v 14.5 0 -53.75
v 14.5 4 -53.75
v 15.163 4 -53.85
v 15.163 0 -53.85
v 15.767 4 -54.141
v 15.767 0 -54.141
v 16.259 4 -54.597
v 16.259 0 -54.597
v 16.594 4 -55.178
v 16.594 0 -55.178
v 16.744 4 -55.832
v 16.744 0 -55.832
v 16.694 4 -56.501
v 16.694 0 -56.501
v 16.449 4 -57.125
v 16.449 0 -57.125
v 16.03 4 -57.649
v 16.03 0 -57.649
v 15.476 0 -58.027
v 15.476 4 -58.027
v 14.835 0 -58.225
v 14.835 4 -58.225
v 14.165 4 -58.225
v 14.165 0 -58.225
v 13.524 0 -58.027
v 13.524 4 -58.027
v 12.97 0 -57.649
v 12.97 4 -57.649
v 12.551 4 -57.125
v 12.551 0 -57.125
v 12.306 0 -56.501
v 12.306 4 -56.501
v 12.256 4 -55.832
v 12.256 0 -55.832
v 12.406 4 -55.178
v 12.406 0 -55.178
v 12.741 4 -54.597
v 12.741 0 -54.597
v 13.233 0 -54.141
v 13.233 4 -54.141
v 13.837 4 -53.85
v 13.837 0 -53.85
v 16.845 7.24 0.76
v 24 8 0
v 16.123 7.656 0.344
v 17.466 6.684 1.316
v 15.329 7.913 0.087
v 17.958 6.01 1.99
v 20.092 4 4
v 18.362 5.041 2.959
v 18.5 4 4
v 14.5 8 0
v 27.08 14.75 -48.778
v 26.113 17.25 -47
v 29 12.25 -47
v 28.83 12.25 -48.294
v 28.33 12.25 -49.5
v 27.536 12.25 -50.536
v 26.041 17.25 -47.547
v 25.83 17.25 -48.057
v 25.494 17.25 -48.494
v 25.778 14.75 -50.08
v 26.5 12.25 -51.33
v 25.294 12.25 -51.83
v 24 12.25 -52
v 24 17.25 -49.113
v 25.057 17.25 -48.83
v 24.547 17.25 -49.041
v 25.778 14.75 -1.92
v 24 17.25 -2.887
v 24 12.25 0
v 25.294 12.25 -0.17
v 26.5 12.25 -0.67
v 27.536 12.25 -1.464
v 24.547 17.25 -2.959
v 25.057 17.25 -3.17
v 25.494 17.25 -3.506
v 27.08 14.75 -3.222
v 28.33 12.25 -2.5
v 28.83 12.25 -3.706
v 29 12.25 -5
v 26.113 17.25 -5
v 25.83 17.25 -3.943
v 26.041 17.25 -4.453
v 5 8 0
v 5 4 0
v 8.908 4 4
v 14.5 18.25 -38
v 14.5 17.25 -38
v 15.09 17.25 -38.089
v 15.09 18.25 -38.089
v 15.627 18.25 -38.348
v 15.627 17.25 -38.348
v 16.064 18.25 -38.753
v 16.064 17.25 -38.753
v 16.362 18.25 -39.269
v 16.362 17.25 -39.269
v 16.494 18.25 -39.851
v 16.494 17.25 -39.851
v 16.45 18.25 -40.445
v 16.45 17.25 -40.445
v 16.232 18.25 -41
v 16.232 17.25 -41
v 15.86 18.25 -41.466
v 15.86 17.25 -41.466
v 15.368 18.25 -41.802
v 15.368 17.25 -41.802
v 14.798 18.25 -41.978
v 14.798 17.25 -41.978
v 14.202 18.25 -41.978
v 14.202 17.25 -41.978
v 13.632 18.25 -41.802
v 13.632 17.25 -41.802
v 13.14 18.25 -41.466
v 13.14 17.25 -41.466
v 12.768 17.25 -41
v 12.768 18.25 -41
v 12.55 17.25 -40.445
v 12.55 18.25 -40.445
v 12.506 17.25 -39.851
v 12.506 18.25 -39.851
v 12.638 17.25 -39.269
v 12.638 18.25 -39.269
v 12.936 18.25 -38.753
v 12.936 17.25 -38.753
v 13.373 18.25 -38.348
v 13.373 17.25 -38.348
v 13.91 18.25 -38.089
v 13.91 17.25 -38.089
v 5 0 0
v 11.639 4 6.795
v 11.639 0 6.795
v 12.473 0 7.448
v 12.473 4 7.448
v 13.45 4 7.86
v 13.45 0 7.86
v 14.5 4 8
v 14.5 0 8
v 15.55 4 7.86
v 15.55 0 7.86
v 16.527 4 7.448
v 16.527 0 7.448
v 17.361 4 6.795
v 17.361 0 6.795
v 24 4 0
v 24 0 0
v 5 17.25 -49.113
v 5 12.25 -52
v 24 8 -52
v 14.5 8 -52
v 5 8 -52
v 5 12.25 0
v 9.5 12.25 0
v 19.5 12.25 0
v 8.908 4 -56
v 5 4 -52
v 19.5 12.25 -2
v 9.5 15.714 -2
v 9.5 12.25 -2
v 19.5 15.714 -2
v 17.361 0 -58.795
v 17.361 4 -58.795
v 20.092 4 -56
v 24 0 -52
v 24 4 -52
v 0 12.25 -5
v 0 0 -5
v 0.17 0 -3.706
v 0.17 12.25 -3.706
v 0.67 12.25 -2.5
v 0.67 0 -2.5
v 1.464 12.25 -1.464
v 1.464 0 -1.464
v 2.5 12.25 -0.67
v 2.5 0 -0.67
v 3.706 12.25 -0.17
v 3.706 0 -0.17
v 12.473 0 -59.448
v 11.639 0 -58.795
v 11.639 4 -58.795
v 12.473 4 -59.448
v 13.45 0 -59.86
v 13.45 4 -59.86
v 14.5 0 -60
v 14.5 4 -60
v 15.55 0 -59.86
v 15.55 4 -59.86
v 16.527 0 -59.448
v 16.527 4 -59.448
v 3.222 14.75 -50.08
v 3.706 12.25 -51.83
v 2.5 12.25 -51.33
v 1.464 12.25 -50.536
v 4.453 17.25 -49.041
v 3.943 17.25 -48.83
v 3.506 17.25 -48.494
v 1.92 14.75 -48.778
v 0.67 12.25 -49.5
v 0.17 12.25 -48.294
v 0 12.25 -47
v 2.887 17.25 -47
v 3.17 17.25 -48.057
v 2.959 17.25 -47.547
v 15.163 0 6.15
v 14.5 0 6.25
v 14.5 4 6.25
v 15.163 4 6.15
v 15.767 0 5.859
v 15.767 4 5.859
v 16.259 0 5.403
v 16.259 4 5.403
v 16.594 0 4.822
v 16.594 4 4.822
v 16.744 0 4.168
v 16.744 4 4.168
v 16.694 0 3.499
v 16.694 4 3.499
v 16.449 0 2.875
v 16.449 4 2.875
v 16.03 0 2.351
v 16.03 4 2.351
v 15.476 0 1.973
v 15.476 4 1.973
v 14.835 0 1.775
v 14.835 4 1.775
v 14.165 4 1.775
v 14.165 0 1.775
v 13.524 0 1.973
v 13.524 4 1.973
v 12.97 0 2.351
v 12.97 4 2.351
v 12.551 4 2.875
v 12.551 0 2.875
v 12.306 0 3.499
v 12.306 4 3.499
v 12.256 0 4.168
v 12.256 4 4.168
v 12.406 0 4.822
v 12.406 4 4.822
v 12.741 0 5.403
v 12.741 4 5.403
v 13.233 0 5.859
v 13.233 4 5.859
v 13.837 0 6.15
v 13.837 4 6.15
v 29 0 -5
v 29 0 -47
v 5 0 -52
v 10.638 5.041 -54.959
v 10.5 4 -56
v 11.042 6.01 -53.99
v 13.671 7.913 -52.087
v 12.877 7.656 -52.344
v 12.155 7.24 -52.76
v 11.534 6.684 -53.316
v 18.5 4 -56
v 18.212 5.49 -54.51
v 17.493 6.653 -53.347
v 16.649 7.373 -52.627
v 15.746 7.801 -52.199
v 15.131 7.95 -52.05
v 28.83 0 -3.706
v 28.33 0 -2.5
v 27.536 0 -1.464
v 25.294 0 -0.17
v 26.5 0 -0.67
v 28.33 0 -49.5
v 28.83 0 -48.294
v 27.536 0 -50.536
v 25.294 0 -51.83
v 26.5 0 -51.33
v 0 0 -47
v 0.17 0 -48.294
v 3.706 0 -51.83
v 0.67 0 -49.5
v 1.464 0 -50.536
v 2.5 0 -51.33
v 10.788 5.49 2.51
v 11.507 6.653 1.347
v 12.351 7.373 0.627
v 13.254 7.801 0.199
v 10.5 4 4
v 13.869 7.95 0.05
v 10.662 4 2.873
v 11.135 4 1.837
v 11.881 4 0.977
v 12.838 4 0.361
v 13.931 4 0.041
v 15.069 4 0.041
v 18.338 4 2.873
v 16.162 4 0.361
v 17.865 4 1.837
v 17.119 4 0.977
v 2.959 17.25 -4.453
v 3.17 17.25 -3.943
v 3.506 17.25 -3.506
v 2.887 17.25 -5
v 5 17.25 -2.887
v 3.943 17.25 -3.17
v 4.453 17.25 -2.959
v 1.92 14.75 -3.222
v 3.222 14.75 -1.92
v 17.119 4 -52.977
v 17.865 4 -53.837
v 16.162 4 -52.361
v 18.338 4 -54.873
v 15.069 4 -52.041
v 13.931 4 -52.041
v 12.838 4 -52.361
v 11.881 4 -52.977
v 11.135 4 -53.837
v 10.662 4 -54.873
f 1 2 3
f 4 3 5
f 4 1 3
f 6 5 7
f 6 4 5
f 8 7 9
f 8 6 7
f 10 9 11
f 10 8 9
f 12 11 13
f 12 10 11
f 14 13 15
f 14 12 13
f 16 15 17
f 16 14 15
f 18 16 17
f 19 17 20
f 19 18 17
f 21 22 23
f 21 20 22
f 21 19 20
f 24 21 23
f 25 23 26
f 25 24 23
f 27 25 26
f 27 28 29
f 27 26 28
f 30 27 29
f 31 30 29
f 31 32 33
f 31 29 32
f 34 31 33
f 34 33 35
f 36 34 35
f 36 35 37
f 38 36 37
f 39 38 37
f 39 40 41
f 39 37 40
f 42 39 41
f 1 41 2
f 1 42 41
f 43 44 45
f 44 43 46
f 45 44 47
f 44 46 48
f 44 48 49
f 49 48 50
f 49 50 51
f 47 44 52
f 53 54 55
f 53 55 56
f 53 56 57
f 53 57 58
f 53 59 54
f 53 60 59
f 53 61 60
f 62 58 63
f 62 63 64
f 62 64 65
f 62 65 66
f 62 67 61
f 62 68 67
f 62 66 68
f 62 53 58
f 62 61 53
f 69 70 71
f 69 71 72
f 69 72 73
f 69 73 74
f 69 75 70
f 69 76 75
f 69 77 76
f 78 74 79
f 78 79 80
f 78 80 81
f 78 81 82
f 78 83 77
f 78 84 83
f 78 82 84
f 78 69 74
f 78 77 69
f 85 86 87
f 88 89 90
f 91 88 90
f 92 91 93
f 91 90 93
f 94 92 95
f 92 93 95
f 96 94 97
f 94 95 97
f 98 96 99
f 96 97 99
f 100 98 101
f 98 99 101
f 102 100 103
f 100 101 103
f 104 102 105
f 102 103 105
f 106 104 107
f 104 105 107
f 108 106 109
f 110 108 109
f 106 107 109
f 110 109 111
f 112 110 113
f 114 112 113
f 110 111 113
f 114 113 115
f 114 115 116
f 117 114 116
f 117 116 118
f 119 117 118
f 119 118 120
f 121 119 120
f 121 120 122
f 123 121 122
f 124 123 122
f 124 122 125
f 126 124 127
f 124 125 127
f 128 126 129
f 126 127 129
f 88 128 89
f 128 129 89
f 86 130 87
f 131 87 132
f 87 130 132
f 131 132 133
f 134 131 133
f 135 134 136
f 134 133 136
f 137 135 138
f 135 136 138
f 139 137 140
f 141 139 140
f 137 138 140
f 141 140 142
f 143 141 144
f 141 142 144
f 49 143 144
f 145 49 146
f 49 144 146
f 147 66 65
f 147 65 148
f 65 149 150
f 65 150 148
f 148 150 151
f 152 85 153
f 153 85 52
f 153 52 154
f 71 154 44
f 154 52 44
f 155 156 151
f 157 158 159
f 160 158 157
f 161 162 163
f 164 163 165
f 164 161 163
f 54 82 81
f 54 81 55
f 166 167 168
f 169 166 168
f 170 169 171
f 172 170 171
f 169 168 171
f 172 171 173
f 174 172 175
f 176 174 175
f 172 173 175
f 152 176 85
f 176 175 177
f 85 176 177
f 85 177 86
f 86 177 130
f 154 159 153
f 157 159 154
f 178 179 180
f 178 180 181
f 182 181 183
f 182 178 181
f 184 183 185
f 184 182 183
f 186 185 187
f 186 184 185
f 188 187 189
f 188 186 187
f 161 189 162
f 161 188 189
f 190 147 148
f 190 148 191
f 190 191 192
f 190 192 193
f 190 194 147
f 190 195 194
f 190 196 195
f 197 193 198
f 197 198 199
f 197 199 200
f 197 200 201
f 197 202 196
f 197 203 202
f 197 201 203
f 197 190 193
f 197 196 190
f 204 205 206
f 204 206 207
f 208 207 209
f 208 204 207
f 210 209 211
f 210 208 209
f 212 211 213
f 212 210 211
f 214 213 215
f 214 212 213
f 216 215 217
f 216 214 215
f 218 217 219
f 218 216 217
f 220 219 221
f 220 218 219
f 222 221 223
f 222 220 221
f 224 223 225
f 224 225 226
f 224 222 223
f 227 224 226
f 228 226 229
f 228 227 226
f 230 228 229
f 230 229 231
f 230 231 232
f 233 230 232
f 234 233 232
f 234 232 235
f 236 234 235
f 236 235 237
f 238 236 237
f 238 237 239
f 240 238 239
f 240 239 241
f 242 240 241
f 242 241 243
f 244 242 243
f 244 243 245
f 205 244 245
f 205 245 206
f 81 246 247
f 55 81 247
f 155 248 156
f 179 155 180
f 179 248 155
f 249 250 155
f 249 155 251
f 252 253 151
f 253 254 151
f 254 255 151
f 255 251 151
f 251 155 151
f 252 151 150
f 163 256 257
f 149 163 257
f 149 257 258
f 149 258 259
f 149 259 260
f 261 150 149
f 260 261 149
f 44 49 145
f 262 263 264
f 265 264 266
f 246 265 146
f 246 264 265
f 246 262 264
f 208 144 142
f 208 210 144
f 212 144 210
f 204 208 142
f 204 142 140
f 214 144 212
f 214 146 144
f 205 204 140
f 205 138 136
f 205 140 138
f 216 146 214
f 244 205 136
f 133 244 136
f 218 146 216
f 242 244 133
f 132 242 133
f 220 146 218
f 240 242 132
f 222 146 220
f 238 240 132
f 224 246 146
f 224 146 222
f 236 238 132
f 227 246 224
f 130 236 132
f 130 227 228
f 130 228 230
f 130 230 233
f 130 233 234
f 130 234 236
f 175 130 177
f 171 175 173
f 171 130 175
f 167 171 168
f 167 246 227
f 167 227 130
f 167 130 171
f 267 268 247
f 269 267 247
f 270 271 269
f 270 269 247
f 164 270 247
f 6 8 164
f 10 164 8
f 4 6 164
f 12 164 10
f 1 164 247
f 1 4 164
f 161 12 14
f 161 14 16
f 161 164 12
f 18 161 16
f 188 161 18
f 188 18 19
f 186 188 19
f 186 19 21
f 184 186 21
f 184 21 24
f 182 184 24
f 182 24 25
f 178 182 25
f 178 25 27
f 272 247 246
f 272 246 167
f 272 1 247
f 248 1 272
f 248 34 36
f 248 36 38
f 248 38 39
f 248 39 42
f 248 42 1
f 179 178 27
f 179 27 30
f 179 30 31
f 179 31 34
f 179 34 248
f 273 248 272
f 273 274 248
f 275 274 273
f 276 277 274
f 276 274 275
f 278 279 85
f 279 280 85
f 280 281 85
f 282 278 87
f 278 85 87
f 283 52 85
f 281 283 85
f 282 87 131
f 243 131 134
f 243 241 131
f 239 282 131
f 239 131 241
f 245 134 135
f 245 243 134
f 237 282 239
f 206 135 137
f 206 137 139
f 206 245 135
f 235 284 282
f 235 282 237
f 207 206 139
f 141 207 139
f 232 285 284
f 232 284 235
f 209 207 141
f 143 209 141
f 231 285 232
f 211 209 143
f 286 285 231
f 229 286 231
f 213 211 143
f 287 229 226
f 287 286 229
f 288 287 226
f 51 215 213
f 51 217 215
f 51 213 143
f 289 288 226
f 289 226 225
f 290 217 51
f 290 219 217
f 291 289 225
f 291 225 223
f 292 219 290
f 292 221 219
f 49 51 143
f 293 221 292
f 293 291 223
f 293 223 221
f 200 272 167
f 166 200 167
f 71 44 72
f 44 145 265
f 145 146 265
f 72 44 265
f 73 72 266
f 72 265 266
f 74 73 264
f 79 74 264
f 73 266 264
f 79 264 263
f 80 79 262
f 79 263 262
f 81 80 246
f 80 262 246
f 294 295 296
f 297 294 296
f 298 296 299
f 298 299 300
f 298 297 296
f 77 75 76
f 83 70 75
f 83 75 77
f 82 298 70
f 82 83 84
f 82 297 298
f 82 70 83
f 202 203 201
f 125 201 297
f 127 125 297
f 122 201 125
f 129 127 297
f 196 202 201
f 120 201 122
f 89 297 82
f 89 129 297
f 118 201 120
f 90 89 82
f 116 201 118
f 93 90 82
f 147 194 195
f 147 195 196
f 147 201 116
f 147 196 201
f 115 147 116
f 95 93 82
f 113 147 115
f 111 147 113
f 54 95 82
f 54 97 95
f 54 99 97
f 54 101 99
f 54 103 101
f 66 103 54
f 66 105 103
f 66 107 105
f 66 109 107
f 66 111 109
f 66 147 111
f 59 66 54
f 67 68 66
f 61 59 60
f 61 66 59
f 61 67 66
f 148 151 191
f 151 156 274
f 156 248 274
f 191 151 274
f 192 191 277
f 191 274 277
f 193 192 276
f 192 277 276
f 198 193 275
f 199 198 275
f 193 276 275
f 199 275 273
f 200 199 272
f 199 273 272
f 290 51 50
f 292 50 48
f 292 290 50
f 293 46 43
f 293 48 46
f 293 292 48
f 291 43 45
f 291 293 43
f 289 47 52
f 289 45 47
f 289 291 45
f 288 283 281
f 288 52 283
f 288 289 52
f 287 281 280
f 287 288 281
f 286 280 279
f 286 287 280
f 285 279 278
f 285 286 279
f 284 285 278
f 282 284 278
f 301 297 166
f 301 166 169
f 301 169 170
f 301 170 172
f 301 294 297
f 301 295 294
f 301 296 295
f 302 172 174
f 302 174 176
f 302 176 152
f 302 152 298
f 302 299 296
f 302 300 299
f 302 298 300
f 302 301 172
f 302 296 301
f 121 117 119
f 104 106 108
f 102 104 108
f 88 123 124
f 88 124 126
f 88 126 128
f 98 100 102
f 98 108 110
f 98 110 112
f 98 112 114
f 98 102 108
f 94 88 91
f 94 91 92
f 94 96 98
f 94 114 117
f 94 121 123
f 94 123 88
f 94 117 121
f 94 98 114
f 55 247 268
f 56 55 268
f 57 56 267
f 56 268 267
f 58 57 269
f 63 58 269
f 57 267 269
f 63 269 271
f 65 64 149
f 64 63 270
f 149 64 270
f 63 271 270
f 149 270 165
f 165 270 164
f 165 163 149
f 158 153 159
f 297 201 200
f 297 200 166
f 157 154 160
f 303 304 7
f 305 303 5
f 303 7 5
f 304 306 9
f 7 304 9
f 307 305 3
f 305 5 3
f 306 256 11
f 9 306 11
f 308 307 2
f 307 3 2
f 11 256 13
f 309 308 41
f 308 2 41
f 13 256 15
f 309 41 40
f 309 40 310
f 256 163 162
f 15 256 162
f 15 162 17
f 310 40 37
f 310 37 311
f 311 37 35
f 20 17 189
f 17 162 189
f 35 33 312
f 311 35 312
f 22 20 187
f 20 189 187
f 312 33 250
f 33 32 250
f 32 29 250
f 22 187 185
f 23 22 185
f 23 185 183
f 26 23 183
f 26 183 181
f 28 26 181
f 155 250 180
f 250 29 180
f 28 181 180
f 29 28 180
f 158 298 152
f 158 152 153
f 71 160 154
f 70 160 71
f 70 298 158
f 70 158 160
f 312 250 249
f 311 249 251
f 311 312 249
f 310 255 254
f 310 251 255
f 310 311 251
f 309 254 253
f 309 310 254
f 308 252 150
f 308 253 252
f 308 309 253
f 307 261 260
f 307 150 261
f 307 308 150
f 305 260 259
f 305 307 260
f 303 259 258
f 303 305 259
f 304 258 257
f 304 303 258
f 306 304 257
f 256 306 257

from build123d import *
from OCP.BRepFilletAPI import BRepFilletAPI_MakeChamfer
from build123d.topology import SkipClean

# Parameters (mm, degrees)
Y_KSEKLIK_EKSTR_ZYON2_DEPTH = 17.25
IZIM1_3_R                   = 2.25
Y_KSEKLIK_EKSTR_ZYON3_DEPTH = 4
PAH2_SIZE                   = 5
PAH2_SIZE2                  = 2.886751346
Y_KSEKLIK_EKSTR_ZYON4_DEPTH = 4
KES_EKSTR_ZYON2_DEPTH       = 24
IZIM7_W                     = 10
IZIM7_H                     = 2
KES_EKSTR_ZYON3_DEPTH       = 5
IZIM8_R                     = 2
Y_KSEKLIK_EKSTR_ZYON6_DEPTH = 1
IZIM10_R                    = 4
KES_EKSTR_ZYON4_DEPTH       = 10
IZIM11_R                    = 4
KES_EKSTR_ZYON5_DEPTH       = 10
KES_EKSTR_ZYON6_DEPTH       = 30


with BuildPart() as part:
    # Çizim1 → Yükseklik-Ekstrüzyon2 (new body)
    with BuildSketch(Plane(origin=(0, 0, 0), x_dir=(1, 0, 0), z_dir=(0, 1, 0))):
        with BuildLine():
            ThreePointArc((0, 5), (1.464466094, 1.464466094), (5, 0))
            Line((5, 0), (24, 0))
            ThreePointArc((24, 0), (27.535533906, 1.464466094), (29, 5))
            Line((29, 5), (29, 47))
            ThreePointArc((29, 47), (27.535533906, 50.535533906), (24, 52))
            Line((24, 52), (5, 52))
            ThreePointArc((5, 52), (1.464466094, 50.535533906), (0, 47))
            Line((0, 47), (0, 5))
        make_face()
    extrude(amount=Y_KSEKLIK_EKSTR_ZYON2_DEPTH)

    # Çizim1<3> → Yükseklik-Ekstrüzyon3 (add)
    # profile 1 of 2: a face of its own
    with BuildSketch(Plane(origin=(0, 0, 0), x_dir=(1, 0, 0), z_dir=(0, 1, 0))):
        with BuildLine():
            Line((24, 0), (5, 0))
            Line((5, 0), (11.638823529, -6.795294118))
            ThreePointArc((11.638823529, -6.795294118), (14.5, -8), (17.361176471, -6.795294118))
            Line((17.361176471, -6.795294118), (24, 0))
        make_face()
        with Locations((14.5, -4)):
            Circle(IZIM1_3_R, mode=Mode.SUBTRACT)
    # profile 2 of 2: a face of its own
    with BuildSketch(Plane(origin=(0, 0, 0), x_dir=(1, 0, 0), z_dir=(0, 1, 0))):
        with BuildLine():
            Line((11.638823529, 58.795294118), (5, 52))
            Line((5, 52), (24, 52))
            Line((24, 52), (17.361176471, 58.795294118))
            ThreePointArc((17.361176471, 58.795294118), (14.5, 60), (11.638823529, 58.795294118))
        make_face()
        with Locations((14.5, 56)):
            Circle(IZIM1_3_R, mode=Mode.SUBTRACT)
    extrude(amount=Y_KSEKLIK_EKSTR_ZYON3_DEPTH)

    # Pah2: one chamfer whose edges measure the first distance from different faces: ONE call of the kernel's chamfer builder (chamfer() names one face for all edges)
    pah2_edges_1 = [part.edges().sort_by_distance(p)[0] for p in [
        (27.535533906, 17.25, -1.464466094),
    ]]
    pah2_side_1 = [part.faces().sort_by_distance(p)[0] for p in [
        (27.535533906, 8.625, -1.464466094),
    ]]
    pah2_edges_2 = [part.edges().sort_by_distance(p)[0] for p in [
        (14.5, 17.25, 0),
    ]]
    pah2_side_2 = [part.faces().sort_by_distance(p)[0] for p in [
        (14.5, 10.625, 0),
    ]]
    pah2_edges_3 = [part.edges().sort_by_distance(p)[0] for p in [
        (1.464466094, 17.25, -1.464466094),
    ]]
    pah2_side_3 = [part.faces().sort_by_distance(p)[0] for p in [
        (1.464466094, 8.625, -1.464466094),
    ]]
    pah2_edges_4 = [part.edges().sort_by_distance(p)[0] for p in [
        (0, 17.25, -26),
    ]]
    pah2_side_4 = [part.faces().sort_by_distance(p)[0] for p in [
        (0, 8.625, -26),
    ]]
    pah2_edges_5 = [part.edges().sort_by_distance(p)[0] for p in [
        (1.464466094, 17.25, -50.535533906),
    ]]
    pah2_side_5 = [part.faces().sort_by_distance(p)[0] for p in [
        (1.464466094, 8.625, -50.535533906),
    ]]
    pah2_edges_6 = [part.edges().sort_by_distance(p)[0] for p in [
        (14.5, 17.25, -52),
    ]]
    pah2_side_6 = [part.faces().sort_by_distance(p)[0] for p in [
        (14.5, 10.625, -52),
    ]]
    pah2_edges_7 = [part.edges().sort_by_distance(p)[0] for p in [
        (27.535533906, 17.25, -50.535533906),
    ]]
    pah2_side_7 = [part.faces().sort_by_distance(p)[0] for p in [
        (27.535533906, 8.625, -50.535533906),
    ]]
    pah2_edges_8 = [part.edges().sort_by_distance(p)[0] for p in [
        (29, 17.25, -26),
    ]]
    pah2_side_8 = [part.faces().sort_by_distance(p)[0] for p in [
        (29, 8.625, -26),
    ]]
    pah2 = BRepFilletAPI_MakeChamfer(part.part.solid().wrapped)
    for e in pah2_edges_1:
        pah2.Add(PAH2_SIZE, PAH2_SIZE2, e.wrapped, pah2_side_1[0].wrapped)  # the first distance lies on this face
    for e in pah2_edges_2:
        pah2.Add(PAH2_SIZE, PAH2_SIZE2, e.wrapped, pah2_side_2[0].wrapped)  # the first distance lies on this face
    for e in pah2_edges_3:
        pah2.Add(PAH2_SIZE, PAH2_SIZE2, e.wrapped, pah2_side_3[0].wrapped)  # the first distance lies on this face
    for e in pah2_edges_4:
        pah2.Add(PAH2_SIZE, PAH2_SIZE2, e.wrapped, pah2_side_4[0].wrapped)  # the first distance lies on this face
    for e in pah2_edges_5:
        pah2.Add(PAH2_SIZE, PAH2_SIZE2, e.wrapped, pah2_side_5[0].wrapped)  # the first distance lies on this face
    for e in pah2_edges_6:
        pah2.Add(PAH2_SIZE, PAH2_SIZE2, e.wrapped, pah2_side_6[0].wrapped)  # the first distance lies on this face
    for e in pah2_edges_7:
        pah2.Add(PAH2_SIZE, PAH2_SIZE2, e.wrapped, pah2_side_7[0].wrapped)  # the first distance lies on this face
    for e in pah2_edges_8:
        pah2.Add(PAH2_SIZE, PAH2_SIZE2, e.wrapped, pah2_side_8[0].wrapped)  # the first distance lies on this face
    add(Compound.cast(pah2.Shape()), mode=Mode.REPLACE)

    # Çizim4 → Yükseklik-Ekstrüzyon4 (add)
    with SkipClean():  # the faces are left unmerged after this step: merging them gives an invalid solid
        with BuildSketch(Plane(origin=(0, 4, 0), x_dir=(1, 0, 0), z_dir=(0, 1, 0))):
            with BuildLine():
                Line((8.907894737, 56), (12.25, 56))
                ThreePointArc((12.25, 56), (14.5, 53.75), (16.75, 56))
                Line((16.75, 56), (20.092105263, 56))
                Line((20.092105263, 56), (24, 52))
                Line((24, 52), (5, 52))
                Line((5, 52), (8.907894737, 56))
            make_face()
            with BuildLine():
                Line((5, 0), (8.907894737, -4))
                Line((8.907894737, -4), (12.25, -4))
                ThreePointArc((12.25, -4), (14.5, -1.75), (16.75, -4))
                Line((16.75, -4), (20.092105263, -4))
                Line((20.092105263, -4), (24, 0))
                Line((24, 0), (5, 0))
            make_face()
        extrude(amount=Y_KSEKLIK_EKSTR_ZYON4_DEPTH)

    # Çizim5 → Kes-Ekstrüzyon2 (cut)
    with SkipClean():  # the faces are left unmerged after this step: merging them gives an invalid solid
        with BuildSketch(Plane.ZY):
            Polygon((0, 8), (4, 4), (4, 8), align=None)
        extrude(amount=-KES_EKSTR_ZYON2_DEPTH, mode=Mode.SUBTRACT)

    # Çizim7 → Kes-Ekstrüzyon3 (cut)
    with SkipClean():  # the faces are left unmerged after this step: merging them gives an invalid solid
        with BuildSketch(Plane(origin=(0, 17.25, 0), x_dir=(1, 0, 0), z_dir=(0, 1, 0))):
            with Locations((14.5, 1)):
                Rectangle(IZIM7_W, IZIM7_H)
        extrude(amount=-KES_EKSTR_ZYON3_DEPTH, mode=Mode.SUBTRACT)

    # Çizim8 → Yükseklik-Ekstrüzyon6 (add)
    with SkipClean():  # the faces are left unmerged after this step: merging them gives an invalid solid
        with BuildSketch(Plane(origin=(0, 17.25, 0), x_dir=(1, 0, 0), z_dir=(0, 1, 0))):
            with Locations((14.5, 40)):
                Circle(IZIM8_R)
        extrude(amount=Y_KSEKLIK_EKSTR_ZYON6_DEPTH)

    # Çizim10 → Kes-Ekstrüzyon4 (cut)
    with SkipClean():  # the faces are left unmerged after this step: merging them gives an invalid solid
        with BuildSketch(Plane(origin=(0, 4, 0), x_dir=(1, 0, 0), z_dir=(0, 1, 0))):
            with Locations((14.5, 56)):
                Circle(IZIM10_R)
        extrude(amount=KES_EKSTR_ZYON4_DEPTH, mode=Mode.SUBTRACT)

    # Çizim11 → Kes-Ekstrüzyon5 (cut)
    with BuildSketch(Plane(origin=(0, 4, 0), x_dir=(1, 0, 0), z_dir=(0, 1, 0))):
        with Locations((14.5, -4)):
            Circle(IZIM11_R)
    extrude(amount=KES_EKSTR_ZYON5_DEPTH, mode=Mode.SUBTRACT)

    # Çizim12 → Kes-Ekstrüzyon6 (cut)
    with BuildSketch(Plane.ZY):
        Polygon((-52, 8), (-56, 8), (-56, 4), align=None)
    extrude(amount=-KES_EKSTR_ZYON6_DEPTH, mode=Mode.SUBTRACT)


solid = part.part
